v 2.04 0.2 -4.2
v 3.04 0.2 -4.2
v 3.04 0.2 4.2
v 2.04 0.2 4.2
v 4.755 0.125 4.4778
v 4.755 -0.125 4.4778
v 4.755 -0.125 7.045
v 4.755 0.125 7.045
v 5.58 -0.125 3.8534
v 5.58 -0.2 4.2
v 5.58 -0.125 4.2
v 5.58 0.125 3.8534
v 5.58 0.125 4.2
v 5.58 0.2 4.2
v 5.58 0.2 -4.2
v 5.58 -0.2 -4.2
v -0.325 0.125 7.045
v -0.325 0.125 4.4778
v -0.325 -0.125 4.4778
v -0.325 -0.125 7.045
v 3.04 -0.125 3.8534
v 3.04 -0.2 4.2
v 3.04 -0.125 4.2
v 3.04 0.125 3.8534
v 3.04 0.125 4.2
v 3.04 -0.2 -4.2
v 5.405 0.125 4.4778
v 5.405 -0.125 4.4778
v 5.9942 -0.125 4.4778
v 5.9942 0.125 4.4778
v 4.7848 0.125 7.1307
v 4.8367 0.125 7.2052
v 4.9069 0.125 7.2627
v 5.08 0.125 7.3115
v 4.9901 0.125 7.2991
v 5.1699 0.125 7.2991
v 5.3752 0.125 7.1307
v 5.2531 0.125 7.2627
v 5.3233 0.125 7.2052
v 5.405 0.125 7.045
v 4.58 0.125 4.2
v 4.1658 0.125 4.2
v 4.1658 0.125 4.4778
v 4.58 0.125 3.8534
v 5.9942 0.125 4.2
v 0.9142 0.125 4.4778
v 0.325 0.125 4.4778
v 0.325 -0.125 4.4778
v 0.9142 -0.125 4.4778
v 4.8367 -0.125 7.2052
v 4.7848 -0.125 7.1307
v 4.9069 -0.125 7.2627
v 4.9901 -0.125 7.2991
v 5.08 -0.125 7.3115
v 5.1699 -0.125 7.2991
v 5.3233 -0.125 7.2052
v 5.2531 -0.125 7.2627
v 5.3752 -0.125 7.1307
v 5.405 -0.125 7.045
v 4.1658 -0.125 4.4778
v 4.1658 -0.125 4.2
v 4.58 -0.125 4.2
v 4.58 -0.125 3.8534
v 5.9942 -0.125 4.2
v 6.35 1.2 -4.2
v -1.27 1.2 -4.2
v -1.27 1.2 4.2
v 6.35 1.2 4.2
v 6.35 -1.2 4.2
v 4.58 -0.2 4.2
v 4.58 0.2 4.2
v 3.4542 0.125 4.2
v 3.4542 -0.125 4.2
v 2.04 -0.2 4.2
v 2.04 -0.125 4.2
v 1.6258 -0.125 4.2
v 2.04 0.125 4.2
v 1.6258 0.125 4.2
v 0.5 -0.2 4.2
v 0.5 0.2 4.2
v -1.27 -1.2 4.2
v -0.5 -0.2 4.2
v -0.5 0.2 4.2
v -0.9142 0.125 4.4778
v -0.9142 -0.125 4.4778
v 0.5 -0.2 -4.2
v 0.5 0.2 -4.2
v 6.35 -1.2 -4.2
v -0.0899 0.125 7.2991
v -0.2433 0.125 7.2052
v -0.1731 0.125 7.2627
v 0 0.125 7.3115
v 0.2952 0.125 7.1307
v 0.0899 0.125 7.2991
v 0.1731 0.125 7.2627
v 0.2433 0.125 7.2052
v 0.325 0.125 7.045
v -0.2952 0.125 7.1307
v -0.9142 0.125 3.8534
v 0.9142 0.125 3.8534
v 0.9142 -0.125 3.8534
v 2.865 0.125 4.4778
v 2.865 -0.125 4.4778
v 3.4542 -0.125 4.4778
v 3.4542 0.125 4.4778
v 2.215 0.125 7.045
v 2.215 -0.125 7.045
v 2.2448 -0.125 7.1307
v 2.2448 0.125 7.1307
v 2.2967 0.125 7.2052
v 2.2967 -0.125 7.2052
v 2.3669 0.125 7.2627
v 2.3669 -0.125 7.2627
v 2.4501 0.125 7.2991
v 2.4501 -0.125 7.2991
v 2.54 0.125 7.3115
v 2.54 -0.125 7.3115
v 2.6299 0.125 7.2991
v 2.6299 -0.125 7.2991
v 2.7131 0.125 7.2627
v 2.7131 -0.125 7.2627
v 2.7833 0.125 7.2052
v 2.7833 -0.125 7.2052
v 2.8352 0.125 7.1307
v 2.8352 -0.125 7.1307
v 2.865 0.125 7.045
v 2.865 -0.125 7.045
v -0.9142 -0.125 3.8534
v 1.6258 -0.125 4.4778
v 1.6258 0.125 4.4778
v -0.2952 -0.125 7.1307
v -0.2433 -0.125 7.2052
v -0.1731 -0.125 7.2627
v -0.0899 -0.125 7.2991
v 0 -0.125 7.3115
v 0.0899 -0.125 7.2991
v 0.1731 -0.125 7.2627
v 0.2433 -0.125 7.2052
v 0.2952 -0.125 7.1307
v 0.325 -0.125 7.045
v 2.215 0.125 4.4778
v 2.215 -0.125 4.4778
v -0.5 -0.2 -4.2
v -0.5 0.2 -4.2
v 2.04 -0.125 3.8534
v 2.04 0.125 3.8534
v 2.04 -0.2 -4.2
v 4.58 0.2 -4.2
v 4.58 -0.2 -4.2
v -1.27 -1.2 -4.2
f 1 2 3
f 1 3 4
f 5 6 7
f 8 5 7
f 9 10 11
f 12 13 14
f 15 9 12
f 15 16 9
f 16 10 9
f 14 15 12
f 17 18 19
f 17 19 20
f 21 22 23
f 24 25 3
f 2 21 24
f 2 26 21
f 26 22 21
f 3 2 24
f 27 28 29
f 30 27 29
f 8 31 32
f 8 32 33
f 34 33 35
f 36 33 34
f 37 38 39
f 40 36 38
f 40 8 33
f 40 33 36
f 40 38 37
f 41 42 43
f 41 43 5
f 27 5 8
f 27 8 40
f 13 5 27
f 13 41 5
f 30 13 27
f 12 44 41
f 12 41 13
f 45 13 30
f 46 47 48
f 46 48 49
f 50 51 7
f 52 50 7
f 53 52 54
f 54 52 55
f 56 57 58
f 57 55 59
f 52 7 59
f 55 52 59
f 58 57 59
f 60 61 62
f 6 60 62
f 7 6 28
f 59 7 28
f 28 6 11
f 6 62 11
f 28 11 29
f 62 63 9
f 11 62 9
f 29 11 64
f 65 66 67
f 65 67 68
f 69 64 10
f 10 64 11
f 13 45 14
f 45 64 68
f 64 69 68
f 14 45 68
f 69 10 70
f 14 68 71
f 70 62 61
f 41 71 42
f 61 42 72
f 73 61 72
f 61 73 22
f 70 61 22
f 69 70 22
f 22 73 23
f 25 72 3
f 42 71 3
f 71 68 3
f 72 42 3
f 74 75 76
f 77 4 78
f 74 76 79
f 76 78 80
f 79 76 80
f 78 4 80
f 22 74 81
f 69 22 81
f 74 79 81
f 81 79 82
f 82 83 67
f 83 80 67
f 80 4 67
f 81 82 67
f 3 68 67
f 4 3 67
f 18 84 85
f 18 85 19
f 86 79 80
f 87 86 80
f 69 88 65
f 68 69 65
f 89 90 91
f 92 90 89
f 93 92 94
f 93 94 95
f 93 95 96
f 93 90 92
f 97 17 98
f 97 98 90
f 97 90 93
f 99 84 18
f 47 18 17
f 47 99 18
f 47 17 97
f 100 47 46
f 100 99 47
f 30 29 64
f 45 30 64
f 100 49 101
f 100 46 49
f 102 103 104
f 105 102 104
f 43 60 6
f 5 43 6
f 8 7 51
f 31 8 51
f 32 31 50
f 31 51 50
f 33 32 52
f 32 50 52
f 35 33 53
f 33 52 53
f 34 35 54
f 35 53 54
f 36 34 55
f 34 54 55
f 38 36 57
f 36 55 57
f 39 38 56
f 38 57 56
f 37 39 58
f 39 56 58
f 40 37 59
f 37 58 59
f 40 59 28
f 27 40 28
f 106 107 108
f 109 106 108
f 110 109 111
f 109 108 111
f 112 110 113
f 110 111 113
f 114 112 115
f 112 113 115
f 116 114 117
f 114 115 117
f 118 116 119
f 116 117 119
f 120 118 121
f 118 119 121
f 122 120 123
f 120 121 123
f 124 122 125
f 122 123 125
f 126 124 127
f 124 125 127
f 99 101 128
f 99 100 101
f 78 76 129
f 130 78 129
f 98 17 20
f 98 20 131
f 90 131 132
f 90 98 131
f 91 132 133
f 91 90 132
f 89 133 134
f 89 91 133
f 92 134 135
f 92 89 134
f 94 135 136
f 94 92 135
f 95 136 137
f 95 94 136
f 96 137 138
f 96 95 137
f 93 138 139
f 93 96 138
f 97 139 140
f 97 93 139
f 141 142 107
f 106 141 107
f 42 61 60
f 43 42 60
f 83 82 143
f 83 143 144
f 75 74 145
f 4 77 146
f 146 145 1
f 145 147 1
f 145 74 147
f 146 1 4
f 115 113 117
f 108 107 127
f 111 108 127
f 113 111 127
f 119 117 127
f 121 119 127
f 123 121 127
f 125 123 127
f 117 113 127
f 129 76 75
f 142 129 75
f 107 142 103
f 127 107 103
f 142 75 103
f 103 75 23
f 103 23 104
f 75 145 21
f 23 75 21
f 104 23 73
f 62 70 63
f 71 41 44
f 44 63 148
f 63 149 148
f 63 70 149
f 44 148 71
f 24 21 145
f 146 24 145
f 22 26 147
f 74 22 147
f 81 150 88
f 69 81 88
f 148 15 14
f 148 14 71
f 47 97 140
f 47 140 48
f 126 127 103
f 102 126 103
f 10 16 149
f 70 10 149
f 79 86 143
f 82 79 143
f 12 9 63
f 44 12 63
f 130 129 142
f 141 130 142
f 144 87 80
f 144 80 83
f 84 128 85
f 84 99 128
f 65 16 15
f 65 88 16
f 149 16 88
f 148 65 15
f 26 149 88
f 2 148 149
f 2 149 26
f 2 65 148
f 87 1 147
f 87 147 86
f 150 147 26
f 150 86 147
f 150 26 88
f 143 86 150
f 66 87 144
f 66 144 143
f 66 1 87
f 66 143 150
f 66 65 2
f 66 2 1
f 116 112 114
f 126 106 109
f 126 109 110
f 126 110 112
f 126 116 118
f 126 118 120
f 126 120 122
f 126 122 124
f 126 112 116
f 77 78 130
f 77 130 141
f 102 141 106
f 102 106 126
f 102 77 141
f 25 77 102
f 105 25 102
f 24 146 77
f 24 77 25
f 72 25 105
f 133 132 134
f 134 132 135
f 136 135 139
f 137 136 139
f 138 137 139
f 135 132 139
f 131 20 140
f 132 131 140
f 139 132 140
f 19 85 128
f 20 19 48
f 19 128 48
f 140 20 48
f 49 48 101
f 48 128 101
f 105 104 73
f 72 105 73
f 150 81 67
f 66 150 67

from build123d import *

# Parameters (mm, degrees)
SKETCH1_W               = 2.54
SKETCH1_H               = 2.4
SKETCH1_W_2             = 1.4
SKETCH1_H_2             = 1.45
BOSS_EXTRUDE1_DEPTH     = 4.2
BOSS_EXTRUDE3_START     = -1.2
BOSS_EXTRUDE3_DEPTH     = 0.125
LPATTERN1_START         = -0.125
LPATTERN1_DEPTH         = 0.25
LPATTERN1_2_DEPTH       = 0.25
LPATTERN1_START_2       = -4.2
LPATTERN1_3_OUTLINE_W   = 5.08
LPATTERN1_3_OUTLINE_H   = 2.4
LPATTERN1_3_OUTLINE_W_2 = 1.4
LPATTERN1_3_OUTLINE_H_2 = 1.45
LPATTERN1_3_DEPTH       = 8.4
SKETCH5_W               = 1.4
SKETCH5_H               = 1.45
SKETCH5_W_2             = 1
SKETCH5_H_2             = 0.4
BOSS_EXTRUDE4_DEPTH     = 8.4
LPATTERN2_COUNT         = 3
LPATTERN2_PITCH         = 2.54


# Read off the part's stored shape, not the designer's step: LPattern1
with BuildPart() as part:
    # Sketch1 → Boss-Extrude1 (new, symmetric)
    with BuildSketch(Plane.XY):
        Rectangle(SKETCH1_W, SKETCH1_H)
        Rectangle(SKETCH1_W_2, SKETCH1_H_2, mode=Mode.SUBTRACT)
    extrude(amount=BOSS_EXTRUDE1_DEPTH, both=True)

    # LPattern1 3 outline → LPattern1 3 (add)
    with BuildSketch(Plane.XY.offset(LPATTERN1_START_2)):
        with Locations((3.81, 0)):
            Rectangle(LPATTERN1_3_OUTLINE_W, LPATTERN1_3_OUTLINE_H)
        with Locations((2.54, 0)):
            Rectangle(LPATTERN1_3_OUTLINE_W_2, LPATTERN1_3_OUTLINE_H_2, mode=Mode.SUBTRACT)
        with Locations((5.08, 0)):
            Rectangle(LPATTERN1_3_OUTLINE_W_2, LPATTERN1_3_OUTLINE_H_2, mode=Mode.SUBTRACT)
    extrude(amount=LPATTERN1_3_DEPTH)

    # Sketch5 → Boss-Extrude4 (add)
    with BuildSketch(Plane(origin=(0, 0, -4.2), x_dir=(-1, 0, 0), z_dir=(0, 0, -1))):
        Rectangle(SKETCH5_W, SKETCH5_H)
        Rectangle(SKETCH5_W_2, SKETCH5_H_2, mode=Mode.SUBTRACT)
    boss_extrude4 = extrude(amount=-BOSS_EXTRUDE4_DEPTH)



with BuildPart() as body_2:
    # Sketch3 → Boss-Extrude3 (new, symmetric)
    with BuildSketch(Plane(origin=(0, 1.2, 0), x_dir=(1, 0, 0), z_dir=(0, 1, 0)).offset(BOSS_EXTRUDE3_START)):
        with BuildLine():
            Line((-0.914219602, -3.853355377), (-0.914219602, -4.477752268))
            Line((-0.914219602, -4.477752268), (-0.325, -4.477752268))
            Line((-0.325, -4.477752268), (-0.325, -7.045003795))
            ThreePointArc((-0.325, -7.045003795), (0, -7.311534777), (0.325, -7.045003795))
            Line((0.325, -7.045003795), (0.325, -4.477752268))
            Line((0.325, -4.477752268), (0.914219602, -4.477752268))
            Line((0.914219602, -4.477752268), (0.914219602, -3.853355377))
            Line((0.914219602, -3.853355377), (-0.914219602, -3.853355377))
        make_face()
    extrude(amount=BOSS_EXTRUDE3_DEPTH, both=True)


with BuildPart() as body_3:
    # LPattern1 outline → LPattern1 (new body)
    with BuildSketch(Plane(origin=(0, 0, 0), x_dir=(1, 0, 0), z_dir=(0, 1, 0)).offset(LPATTERN1_START)):
        with BuildLine():
            Line((3.454219602, -4.477752268), (3.454219602, -3.853355377))
            Line((3.454219602, -3.853355377), (1.625780398, -3.853355377))
            Line((1.625780398, -3.853355377), (1.625780398, -4.477752268))
            Line((1.625780398, -4.477752268), (2.215, -4.477752268))
            Line((2.215, -4.477752268), (2.215, -7.045003795))
            ThreePointArc((2.215, -7.045003795), (2.54, -7.311534777), (2.865, -7.045003795))
            Line((2.865, -7.045003795), (2.865, -4.477752268))
            Line((2.865, -4.477752268), (3.454219602, -4.477752268))
        make_face()
    extrude(amount=LPATTERN1_DEPTH)


with BuildPart() as body_4:
    # LPattern1 2 outline → LPattern1 2 (new body)
    with BuildSketch(Plane(origin=(0, 0, 0), x_dir=(1, 0, 0), z_dir=(0, 1, 0)).offset(LPATTERN1_START)):
        with BuildLine():
            Line((5.994219602, -4.477752268), (5.994219602, -3.853355377))
            Line((5.994219602, -3.853355377), (4.165780398, -3.853355377))
            Line((4.165780398, -3.853355377), (4.165780398, -4.477752268))
            Line((4.165780398, -4.477752268), (4.755, -4.477752268))
            Line((4.755, -4.477752268), (4.755, -7.045003795))
            ThreePointArc((4.755, -7.045003795), (5.08, -7.311534777), (5.405, -7.045003795))
            Line((5.405, -7.045003795), (5.405, -4.477752268))
            Line((5.405, -4.477752268), (5.994219602, -4.477752268))
        make_face()
    extrude(amount=LPATTERN1_2_DEPTH)


with BuildPart() as part_1:
    add(part.part)

    add(body_3.part)  # LPattern2 merges body 3

    add(body_4.part)  # LPattern2 merges body 4
    # LPattern2: Boss-Extrude4 ×3
    with Locations(*[(i * LPATTERN2_PITCH, 0, 0) for i in range(1, LPATTERN2_COUNT)]):
        add(boss_extrude4)


solid = Compound([body_2.part, part_1.part])
